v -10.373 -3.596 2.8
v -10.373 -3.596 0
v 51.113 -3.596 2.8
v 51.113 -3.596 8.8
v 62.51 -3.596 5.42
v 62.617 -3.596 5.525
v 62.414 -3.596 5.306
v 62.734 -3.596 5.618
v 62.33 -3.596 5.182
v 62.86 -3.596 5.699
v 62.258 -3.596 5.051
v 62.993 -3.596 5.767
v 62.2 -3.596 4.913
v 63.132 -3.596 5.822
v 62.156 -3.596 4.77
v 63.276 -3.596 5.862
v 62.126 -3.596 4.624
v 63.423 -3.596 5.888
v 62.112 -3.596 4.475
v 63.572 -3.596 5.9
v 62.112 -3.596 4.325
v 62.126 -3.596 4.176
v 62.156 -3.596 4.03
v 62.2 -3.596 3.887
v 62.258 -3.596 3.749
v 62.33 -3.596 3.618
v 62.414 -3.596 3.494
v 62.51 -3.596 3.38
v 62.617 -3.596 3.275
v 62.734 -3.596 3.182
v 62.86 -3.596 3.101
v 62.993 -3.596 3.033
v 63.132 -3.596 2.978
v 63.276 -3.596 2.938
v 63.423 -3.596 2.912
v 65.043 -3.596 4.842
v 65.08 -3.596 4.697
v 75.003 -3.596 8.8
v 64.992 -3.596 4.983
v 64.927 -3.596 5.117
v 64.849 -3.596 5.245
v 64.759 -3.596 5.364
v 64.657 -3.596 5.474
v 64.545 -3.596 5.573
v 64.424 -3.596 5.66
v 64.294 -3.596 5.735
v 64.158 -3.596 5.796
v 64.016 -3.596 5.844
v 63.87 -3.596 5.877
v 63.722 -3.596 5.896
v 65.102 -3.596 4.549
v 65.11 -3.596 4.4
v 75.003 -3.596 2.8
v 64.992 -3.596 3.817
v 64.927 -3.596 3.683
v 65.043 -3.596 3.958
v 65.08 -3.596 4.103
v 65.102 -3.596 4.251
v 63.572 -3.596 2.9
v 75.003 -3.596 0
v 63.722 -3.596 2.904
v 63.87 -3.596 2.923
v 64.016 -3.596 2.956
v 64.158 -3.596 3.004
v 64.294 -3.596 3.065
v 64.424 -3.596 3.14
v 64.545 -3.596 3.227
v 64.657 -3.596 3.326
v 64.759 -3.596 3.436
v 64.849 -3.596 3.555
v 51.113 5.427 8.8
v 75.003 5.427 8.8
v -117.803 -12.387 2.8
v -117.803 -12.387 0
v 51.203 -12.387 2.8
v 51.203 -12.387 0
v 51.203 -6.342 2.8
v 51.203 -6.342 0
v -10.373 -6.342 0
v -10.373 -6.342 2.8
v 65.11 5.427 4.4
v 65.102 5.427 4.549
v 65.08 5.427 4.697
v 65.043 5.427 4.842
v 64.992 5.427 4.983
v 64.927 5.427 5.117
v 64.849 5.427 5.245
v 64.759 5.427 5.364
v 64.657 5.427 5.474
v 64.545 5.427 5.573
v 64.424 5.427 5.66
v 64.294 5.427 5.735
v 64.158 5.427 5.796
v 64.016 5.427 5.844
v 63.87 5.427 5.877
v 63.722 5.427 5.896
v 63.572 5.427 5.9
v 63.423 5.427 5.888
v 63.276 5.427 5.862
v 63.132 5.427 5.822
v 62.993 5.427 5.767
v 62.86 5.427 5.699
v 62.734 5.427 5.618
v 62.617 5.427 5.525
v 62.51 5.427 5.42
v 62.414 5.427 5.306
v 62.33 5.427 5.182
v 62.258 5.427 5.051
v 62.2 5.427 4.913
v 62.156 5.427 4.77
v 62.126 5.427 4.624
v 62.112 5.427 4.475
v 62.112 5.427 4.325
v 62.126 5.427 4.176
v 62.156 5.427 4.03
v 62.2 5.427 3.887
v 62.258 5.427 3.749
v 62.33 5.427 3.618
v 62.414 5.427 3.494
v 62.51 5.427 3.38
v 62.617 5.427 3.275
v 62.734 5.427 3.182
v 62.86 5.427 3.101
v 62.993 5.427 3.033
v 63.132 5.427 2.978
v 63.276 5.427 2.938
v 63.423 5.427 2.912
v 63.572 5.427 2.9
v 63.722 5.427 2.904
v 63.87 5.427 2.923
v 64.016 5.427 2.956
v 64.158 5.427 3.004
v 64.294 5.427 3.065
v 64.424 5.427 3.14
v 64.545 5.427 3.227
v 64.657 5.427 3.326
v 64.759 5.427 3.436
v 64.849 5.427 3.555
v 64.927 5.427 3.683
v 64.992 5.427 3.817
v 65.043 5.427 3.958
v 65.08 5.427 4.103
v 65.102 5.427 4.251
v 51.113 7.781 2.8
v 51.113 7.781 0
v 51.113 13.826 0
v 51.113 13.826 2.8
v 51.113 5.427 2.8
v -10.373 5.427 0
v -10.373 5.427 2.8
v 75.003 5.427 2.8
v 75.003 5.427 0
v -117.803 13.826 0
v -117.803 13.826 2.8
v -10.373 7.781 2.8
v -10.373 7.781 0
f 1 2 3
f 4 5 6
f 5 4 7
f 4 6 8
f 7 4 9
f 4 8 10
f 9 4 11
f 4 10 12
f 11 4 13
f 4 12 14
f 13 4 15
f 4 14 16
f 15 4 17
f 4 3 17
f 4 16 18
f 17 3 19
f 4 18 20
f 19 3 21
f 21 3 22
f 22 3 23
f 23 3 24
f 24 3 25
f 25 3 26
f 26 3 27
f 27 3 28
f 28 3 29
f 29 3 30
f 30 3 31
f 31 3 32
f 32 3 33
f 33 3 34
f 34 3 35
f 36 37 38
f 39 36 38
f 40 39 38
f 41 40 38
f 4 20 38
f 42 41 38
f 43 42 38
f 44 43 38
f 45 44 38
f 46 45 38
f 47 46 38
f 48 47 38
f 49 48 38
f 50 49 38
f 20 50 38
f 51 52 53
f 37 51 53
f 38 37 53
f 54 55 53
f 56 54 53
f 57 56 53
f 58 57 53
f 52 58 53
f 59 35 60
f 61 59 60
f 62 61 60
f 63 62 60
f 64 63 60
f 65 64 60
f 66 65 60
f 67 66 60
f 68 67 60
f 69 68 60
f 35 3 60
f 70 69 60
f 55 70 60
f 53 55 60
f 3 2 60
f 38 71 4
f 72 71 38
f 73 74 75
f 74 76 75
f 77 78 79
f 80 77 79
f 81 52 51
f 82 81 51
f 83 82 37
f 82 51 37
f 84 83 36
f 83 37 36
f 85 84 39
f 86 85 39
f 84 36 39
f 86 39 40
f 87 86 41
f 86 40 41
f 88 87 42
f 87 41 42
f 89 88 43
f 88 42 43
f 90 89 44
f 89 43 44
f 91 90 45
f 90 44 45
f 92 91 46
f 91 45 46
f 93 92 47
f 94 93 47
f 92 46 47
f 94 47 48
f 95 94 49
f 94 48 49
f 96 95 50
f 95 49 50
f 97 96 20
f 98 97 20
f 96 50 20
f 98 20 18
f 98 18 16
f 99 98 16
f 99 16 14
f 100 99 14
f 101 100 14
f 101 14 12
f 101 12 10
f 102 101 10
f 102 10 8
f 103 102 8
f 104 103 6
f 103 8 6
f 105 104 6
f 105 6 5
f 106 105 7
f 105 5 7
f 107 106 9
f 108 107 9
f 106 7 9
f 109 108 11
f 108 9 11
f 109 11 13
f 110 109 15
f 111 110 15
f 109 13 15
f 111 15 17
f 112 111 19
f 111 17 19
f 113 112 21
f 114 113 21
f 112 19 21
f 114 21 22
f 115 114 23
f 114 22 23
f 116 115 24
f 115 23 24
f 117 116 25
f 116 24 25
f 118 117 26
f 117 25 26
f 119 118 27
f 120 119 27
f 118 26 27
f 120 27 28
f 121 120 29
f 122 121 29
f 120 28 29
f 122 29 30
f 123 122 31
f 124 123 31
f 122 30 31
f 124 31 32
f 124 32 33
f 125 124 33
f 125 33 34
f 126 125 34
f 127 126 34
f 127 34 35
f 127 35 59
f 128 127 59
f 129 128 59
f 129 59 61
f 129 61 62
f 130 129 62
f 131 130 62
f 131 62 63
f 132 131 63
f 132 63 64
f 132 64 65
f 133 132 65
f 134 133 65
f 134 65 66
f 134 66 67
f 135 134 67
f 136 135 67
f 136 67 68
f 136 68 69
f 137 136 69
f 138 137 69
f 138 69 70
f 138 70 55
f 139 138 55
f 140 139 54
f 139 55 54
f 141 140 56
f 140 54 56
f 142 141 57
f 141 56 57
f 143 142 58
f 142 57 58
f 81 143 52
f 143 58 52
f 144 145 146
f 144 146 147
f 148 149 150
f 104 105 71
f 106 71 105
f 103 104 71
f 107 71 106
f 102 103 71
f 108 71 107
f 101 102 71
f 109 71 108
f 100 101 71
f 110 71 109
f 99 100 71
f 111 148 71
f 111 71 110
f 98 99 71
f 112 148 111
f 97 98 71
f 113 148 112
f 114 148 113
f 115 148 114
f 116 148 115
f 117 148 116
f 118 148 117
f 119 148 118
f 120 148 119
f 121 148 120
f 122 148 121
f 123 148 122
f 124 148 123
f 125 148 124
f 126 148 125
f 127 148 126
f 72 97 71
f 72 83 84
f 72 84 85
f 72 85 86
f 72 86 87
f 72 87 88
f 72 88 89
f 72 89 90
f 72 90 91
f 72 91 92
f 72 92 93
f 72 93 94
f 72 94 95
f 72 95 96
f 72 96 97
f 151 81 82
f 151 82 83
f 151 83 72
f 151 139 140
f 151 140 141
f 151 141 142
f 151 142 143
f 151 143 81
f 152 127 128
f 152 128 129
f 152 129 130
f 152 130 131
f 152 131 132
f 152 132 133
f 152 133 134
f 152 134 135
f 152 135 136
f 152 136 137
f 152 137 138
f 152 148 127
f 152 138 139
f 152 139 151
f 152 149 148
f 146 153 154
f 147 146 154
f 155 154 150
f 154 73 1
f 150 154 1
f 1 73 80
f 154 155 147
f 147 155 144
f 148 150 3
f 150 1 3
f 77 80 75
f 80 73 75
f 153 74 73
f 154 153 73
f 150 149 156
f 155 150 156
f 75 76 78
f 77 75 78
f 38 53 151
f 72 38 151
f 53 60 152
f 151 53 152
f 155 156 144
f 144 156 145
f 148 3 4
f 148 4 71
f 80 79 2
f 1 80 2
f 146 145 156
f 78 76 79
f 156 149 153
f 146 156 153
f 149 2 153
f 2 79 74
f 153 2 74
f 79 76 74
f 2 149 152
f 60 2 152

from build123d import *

# Parameters (mm, degrees)
F1_DEPTH = 2.8
F2_DEPTH = 23.8
F3_DEPTH = 23.89
F4_DEPTH = 42.8
F5_W     = 23.89
F5_H     = 9.0229478665
F6_DEPTH = 6
F7_R     = 1.5
F8_DEPTH = 9.0229478665
F9_DEPTH = 1.439


with BuildPart() as f1:
    # F0 (on Top) → F1 (new body)
    with BuildSketch(Plane.XY):
        Polygon((-75.0034600496, -12.3867541552), (75.0034600496, -12.3867541552), (75.0034600496, -6.3421353698), (-10.3727839887, -6.3421353698), (-10.3727839887, -3.5960208625), (75.0034600496, -3.5960208625), (75.0034600496, 5.426927004), (-10.3727839887, 5.426927004), (-10.3727839887, 7.7807395719), (75.0034600496, 7.7807395719), (75.0034600496, 12.3867541552), (-75.0034600496, 12.3867541552), align=None)
    extrude(amount=F1_DEPTH)

    # F2 (cut): a face of the model
    f2_faces = [f1.faces().sort_by_distance(p)[0] for p in [
        (75.0034600496, -9.3644447625, 1.4),
    ]]
    extrude(f2_faces, amount=-F2_DEPTH, mode=Mode.SUBTRACT)

    # F3 (cut): a face of the model
    f3_faces = [f1.faces().sort_by_distance(p)[0] for p in [
        (75.0034600496, 10.0837468635, 1.4),
    ]]
    extrude(f3_faces, amount=-F3_DEPTH, mode=Mode.SUBTRACT)

    # F4 (add): a face of the model
    f4_faces = [f1.faces().sort_by_distance(p)[0] for p in [
        (-75.0034600496, 0, 1.4),
    ]]
    extrude(f4_faces, amount=F4_DEPTH)

    # F5 (on face) → F6 (join)
    with BuildSketch(Plane.XY.offset(2.8)):
        with Locations((63.0584600496, 0.9154530708)):
            Rectangle(F5_W, F5_H)
    extrude(amount=F6_DEPTH)

    # F7 (on face) → F8 (cut, through all)
    with BuildSketch(Plane.XZ.offset(3.5960208625)):
        with Locations((63.6097043753, 4.4)):
            Circle(F7_R)
    extrude(amount=-F8_DEPTH, mode=Mode.SUBTRACT)

    # F9 (add): a face of the model
    f9_faces = [f1.faces().sort_by_distance(p)[0] for p in [
        (-33.345, 12.3867541552, 1.4),
    ]]
    extrude(f9_faces, amount=F9_DEPTH)


solid = f1.part
